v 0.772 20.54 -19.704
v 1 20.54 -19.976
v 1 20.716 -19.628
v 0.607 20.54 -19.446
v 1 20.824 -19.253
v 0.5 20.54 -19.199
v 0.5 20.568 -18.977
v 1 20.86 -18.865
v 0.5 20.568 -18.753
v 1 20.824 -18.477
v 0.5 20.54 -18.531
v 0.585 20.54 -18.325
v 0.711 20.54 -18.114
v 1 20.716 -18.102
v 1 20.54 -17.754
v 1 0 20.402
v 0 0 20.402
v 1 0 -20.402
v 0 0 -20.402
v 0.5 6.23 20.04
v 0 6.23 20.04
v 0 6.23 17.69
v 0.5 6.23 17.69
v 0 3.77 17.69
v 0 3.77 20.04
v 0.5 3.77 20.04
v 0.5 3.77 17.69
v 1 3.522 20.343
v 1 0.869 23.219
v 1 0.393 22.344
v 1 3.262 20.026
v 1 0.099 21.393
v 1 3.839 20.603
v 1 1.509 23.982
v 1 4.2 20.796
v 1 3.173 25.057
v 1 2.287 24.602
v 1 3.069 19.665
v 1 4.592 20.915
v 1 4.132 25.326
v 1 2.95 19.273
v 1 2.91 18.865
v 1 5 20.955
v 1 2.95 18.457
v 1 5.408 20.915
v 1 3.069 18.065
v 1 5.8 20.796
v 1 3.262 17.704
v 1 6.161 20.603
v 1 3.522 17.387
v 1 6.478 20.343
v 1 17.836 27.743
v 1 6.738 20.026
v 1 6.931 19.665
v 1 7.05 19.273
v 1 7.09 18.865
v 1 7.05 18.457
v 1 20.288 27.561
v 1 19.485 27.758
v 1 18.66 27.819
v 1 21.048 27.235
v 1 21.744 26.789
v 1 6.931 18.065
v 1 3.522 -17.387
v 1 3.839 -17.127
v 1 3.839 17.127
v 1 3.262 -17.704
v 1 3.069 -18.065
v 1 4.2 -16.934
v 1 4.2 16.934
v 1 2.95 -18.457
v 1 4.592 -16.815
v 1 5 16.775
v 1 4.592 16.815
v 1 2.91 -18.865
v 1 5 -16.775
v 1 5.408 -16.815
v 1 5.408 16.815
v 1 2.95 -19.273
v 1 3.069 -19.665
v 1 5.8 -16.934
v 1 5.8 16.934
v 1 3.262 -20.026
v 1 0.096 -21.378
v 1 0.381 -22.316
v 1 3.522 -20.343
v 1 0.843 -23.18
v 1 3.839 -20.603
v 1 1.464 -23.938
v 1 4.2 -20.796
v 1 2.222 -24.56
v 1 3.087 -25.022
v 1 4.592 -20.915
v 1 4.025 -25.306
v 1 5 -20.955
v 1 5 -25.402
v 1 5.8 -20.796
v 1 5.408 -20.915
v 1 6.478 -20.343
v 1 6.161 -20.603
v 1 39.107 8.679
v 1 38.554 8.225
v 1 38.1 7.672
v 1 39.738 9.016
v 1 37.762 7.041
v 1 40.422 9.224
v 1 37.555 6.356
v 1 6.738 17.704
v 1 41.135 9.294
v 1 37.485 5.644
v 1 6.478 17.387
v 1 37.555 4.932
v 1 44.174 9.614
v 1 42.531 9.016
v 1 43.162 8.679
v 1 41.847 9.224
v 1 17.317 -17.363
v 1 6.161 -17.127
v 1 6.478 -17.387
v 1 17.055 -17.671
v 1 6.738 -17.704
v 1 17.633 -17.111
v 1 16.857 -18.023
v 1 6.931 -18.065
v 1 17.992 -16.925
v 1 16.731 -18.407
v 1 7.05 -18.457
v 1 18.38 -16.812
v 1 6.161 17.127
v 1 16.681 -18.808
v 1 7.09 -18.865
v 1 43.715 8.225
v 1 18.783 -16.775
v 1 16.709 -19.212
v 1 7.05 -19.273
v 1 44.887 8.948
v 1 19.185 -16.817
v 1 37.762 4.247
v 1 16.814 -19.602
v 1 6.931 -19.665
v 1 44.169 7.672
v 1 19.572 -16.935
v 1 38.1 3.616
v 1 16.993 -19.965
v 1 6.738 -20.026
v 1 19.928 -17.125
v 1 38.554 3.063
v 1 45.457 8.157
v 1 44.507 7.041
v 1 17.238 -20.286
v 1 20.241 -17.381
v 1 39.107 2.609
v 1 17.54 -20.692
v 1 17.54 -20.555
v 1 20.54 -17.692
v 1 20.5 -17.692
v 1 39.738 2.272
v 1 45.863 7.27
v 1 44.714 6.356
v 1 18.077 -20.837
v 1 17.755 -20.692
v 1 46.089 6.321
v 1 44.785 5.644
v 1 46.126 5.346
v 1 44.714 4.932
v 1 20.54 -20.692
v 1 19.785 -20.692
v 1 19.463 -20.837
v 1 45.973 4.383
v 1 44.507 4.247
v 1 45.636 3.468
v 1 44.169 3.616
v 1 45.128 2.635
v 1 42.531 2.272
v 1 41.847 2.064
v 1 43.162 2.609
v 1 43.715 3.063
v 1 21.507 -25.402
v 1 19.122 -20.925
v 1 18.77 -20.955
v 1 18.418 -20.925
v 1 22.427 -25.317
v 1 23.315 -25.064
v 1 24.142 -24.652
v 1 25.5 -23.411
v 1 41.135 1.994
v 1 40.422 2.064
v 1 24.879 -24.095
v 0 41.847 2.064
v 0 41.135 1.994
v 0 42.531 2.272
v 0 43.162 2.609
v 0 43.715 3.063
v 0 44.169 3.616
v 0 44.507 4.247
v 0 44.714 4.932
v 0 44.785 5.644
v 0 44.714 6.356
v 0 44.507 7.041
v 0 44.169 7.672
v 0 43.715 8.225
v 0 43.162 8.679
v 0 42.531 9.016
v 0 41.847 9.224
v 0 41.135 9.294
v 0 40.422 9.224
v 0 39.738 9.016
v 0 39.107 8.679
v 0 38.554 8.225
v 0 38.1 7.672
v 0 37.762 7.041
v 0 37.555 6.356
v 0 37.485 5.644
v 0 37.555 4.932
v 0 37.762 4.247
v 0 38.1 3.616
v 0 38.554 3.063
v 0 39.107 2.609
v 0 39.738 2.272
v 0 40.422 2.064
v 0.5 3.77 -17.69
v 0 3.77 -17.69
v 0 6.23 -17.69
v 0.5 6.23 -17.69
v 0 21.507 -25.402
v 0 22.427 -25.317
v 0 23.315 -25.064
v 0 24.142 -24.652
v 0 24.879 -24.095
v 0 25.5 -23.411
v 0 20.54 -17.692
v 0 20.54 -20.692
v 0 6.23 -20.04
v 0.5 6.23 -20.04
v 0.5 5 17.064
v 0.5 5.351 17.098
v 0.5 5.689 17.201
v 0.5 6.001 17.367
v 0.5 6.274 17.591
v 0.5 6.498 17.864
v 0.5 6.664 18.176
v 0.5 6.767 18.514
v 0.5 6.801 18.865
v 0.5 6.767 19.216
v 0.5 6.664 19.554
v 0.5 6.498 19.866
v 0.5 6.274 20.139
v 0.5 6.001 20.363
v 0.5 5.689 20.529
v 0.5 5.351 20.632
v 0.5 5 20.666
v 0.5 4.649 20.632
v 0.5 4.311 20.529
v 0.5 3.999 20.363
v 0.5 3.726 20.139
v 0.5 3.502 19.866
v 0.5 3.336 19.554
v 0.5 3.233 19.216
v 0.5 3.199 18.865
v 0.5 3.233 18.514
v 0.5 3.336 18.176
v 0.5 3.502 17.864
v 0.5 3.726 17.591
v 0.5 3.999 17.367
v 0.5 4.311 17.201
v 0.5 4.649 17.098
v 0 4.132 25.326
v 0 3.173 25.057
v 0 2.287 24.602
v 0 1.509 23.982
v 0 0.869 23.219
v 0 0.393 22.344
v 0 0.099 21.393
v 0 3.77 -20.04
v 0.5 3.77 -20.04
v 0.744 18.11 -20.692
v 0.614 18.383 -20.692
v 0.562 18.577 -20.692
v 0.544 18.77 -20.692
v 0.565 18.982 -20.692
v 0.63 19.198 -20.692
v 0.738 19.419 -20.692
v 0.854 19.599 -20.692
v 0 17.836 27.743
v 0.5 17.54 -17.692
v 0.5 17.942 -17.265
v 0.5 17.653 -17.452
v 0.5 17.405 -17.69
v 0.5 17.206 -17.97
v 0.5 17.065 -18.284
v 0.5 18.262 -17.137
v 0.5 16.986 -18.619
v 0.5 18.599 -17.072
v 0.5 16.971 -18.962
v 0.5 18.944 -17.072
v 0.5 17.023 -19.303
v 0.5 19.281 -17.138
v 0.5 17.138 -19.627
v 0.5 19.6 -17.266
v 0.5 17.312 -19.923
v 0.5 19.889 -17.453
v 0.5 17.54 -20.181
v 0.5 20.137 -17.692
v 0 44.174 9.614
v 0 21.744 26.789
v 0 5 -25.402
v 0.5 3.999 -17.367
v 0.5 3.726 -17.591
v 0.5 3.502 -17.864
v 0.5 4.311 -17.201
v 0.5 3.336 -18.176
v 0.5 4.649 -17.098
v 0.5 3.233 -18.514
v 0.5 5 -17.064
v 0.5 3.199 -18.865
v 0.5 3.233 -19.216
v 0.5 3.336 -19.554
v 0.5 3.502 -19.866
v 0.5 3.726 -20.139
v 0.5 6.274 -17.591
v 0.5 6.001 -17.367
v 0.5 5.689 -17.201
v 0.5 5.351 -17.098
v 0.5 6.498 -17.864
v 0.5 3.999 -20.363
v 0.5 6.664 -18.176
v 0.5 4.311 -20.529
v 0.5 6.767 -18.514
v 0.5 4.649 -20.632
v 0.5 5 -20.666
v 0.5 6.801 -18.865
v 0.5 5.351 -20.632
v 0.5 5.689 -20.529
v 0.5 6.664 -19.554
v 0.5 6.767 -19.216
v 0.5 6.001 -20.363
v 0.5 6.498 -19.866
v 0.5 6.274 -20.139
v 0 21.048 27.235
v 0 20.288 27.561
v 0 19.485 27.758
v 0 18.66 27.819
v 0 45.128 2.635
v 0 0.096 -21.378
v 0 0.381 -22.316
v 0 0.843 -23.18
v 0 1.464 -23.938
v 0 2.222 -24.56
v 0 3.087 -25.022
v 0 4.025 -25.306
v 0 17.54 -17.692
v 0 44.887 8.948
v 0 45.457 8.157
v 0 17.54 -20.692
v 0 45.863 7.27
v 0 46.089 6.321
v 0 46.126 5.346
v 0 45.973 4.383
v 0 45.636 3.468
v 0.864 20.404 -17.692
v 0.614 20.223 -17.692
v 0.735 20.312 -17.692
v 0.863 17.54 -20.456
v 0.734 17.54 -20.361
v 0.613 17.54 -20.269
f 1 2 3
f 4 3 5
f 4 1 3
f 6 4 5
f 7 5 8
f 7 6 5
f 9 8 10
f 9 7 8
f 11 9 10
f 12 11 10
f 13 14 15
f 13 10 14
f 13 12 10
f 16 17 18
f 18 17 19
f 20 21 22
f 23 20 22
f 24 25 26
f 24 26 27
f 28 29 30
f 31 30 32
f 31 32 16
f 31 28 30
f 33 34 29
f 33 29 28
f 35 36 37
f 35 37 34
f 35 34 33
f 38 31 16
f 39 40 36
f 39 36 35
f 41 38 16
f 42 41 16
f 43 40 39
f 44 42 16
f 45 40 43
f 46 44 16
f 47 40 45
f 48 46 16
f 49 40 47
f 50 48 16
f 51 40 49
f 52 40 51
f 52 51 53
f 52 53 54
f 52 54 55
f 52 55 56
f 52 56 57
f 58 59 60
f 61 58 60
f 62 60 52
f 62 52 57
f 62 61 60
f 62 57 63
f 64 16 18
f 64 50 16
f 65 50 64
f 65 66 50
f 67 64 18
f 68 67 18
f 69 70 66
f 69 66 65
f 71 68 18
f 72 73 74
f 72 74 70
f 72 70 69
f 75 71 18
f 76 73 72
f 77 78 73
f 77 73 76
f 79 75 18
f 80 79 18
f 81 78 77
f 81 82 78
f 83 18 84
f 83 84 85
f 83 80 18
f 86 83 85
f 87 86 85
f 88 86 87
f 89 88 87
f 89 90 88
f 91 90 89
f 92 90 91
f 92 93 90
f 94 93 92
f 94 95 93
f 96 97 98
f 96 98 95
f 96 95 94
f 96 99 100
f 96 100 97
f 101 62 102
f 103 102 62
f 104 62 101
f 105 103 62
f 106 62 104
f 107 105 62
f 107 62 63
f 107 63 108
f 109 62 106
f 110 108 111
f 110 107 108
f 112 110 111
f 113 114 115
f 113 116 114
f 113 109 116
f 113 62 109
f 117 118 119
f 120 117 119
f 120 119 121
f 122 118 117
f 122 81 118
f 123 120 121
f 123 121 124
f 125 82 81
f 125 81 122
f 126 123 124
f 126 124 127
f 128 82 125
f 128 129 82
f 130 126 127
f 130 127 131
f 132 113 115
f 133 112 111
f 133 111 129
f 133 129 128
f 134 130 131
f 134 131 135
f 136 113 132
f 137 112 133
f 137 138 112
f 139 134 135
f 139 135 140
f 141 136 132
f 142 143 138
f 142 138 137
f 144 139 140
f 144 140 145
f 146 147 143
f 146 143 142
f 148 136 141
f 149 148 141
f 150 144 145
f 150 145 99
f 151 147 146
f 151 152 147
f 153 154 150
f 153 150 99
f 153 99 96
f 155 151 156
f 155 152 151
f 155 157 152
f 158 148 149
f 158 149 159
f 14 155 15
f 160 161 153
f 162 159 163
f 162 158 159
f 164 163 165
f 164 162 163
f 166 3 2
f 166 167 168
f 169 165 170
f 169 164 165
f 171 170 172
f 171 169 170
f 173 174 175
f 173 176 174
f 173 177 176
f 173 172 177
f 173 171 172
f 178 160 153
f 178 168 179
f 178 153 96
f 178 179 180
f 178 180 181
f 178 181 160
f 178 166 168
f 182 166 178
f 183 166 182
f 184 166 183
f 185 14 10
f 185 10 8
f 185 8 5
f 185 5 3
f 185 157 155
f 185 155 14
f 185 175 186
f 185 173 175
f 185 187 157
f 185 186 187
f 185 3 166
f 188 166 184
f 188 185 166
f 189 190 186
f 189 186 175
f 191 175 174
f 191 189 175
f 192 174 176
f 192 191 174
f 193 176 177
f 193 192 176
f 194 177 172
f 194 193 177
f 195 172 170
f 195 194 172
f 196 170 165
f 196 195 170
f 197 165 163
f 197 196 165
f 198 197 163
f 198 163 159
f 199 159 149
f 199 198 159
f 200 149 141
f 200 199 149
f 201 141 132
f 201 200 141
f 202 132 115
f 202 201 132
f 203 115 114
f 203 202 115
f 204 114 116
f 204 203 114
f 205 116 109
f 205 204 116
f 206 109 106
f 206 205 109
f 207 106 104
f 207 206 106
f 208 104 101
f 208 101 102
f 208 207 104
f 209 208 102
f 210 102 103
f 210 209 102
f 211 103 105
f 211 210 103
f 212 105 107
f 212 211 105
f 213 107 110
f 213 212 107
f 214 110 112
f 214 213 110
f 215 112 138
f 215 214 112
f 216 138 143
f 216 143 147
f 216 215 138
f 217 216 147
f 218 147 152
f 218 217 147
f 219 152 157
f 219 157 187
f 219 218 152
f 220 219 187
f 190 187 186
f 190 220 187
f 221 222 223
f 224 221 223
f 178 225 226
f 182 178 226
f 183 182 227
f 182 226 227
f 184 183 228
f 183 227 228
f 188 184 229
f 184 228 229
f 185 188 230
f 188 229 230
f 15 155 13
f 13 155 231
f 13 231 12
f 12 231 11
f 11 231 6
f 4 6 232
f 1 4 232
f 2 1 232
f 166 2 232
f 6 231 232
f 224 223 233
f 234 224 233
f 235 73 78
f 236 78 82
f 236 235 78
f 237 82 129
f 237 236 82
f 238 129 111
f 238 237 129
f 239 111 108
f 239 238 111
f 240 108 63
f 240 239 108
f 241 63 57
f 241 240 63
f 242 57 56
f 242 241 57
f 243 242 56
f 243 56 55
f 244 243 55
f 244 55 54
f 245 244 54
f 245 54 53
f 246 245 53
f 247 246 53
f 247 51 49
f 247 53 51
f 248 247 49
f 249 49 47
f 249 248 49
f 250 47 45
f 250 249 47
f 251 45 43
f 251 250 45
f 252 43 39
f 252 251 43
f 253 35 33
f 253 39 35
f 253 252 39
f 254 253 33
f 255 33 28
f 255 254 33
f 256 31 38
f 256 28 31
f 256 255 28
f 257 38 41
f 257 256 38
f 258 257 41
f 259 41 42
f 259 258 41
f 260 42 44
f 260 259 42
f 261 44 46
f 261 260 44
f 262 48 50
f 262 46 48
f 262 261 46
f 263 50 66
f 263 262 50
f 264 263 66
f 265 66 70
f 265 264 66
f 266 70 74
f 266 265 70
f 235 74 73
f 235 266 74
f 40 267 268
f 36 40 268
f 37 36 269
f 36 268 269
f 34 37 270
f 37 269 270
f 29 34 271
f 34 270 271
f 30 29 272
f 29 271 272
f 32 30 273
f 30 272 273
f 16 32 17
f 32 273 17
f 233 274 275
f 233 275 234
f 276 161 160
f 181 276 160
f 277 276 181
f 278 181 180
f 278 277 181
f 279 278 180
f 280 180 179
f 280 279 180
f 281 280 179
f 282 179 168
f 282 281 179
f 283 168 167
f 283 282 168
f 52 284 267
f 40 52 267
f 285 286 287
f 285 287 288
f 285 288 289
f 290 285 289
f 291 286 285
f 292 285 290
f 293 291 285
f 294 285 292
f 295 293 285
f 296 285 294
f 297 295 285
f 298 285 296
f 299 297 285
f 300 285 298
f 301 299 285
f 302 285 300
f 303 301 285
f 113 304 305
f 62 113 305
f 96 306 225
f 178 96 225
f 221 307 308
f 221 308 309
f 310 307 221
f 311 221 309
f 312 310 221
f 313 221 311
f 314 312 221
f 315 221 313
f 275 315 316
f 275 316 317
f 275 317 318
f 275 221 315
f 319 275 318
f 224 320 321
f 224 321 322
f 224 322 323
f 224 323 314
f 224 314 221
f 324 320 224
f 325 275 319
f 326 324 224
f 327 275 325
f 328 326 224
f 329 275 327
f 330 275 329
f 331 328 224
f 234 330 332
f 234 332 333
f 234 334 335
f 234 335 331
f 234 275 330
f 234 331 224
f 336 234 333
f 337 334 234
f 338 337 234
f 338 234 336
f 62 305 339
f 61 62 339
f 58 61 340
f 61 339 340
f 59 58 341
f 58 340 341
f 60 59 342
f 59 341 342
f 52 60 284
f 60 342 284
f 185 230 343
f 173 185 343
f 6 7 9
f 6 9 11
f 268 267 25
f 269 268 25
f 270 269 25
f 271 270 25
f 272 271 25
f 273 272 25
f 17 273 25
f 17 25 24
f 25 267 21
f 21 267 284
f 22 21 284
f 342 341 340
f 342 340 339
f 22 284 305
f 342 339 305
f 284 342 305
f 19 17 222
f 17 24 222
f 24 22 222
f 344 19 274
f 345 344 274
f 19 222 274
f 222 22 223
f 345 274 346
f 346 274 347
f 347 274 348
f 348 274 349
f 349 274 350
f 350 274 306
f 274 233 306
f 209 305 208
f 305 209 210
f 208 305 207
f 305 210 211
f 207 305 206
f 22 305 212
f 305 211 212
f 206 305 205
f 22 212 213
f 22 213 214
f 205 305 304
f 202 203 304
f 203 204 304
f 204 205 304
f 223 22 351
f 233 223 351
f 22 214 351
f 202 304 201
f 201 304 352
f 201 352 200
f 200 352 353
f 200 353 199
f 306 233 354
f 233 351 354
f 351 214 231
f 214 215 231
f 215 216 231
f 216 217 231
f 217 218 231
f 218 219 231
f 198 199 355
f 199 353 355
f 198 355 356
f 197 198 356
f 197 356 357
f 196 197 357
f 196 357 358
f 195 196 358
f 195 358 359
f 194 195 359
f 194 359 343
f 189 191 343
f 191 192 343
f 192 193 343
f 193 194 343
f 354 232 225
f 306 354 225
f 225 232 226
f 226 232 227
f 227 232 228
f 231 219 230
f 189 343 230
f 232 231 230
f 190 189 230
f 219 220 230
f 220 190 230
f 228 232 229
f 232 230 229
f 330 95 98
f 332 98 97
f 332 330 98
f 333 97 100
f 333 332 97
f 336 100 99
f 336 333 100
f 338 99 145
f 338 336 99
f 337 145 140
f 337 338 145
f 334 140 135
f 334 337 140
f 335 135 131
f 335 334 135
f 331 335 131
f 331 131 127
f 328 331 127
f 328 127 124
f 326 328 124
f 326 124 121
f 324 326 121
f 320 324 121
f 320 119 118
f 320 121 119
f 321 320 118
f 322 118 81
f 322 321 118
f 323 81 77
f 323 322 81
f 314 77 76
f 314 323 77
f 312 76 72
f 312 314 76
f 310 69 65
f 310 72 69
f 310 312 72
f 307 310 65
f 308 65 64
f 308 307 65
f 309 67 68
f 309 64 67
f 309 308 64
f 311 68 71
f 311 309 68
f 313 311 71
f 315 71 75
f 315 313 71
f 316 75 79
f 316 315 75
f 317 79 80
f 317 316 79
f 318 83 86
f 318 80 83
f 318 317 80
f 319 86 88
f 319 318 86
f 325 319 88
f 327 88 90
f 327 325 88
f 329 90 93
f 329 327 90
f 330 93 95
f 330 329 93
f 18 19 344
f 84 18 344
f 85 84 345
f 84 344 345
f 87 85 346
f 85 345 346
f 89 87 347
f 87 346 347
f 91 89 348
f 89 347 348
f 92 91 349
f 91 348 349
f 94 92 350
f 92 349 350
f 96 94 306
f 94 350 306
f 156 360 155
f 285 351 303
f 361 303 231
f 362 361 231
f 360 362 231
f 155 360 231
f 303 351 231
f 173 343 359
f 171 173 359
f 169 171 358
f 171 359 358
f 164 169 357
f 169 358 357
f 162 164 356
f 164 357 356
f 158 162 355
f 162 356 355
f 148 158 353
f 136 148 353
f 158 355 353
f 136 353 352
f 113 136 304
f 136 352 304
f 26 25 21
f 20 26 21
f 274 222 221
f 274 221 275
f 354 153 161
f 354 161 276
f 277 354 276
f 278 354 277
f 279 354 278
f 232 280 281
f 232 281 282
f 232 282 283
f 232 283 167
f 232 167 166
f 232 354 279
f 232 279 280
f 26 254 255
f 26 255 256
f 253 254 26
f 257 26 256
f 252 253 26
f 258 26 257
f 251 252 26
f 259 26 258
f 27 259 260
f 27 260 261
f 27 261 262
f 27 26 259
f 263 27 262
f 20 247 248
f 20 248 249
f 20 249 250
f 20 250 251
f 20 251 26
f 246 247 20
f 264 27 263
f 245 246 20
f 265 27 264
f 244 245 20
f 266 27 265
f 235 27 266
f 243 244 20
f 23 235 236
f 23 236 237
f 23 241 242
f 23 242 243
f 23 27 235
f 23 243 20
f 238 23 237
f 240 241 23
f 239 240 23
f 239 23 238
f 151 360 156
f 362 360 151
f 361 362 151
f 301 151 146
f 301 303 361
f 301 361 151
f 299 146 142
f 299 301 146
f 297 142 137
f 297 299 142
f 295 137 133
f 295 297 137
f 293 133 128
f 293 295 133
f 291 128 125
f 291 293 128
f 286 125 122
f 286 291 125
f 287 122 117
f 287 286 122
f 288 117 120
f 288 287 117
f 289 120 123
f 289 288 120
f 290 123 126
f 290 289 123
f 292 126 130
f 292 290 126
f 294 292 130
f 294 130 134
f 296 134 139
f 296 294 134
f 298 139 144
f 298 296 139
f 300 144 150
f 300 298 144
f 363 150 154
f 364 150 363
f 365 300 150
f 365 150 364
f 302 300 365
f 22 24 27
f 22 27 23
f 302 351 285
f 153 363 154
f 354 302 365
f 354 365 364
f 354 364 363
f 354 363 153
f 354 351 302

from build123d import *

# Parameters (mm, degrees)
SKETCH1_R           = 3.65
SKETCH1_W           = 3
SKETCH1_H           = 3
SKETCH1_W_2         = 2.35
SKETCH1_H_2         = 2.46
BOSS_EXTRUDE1_DEPTH = 1
SKETCH3_R           = 2.09
CUT_EXTRUDE1_DEPTH  = 0.5
CUT_EXTRUDE1_TAPER  = 30


with BuildPart() as part:
    # Sketch1 → Boss-Extrude1 (new body)
    with BuildSketch(Plane(origin=(0, 0, 0), x_dir=(0, 0, -1), z_dir=(1, 0, 0))):
        with BuildLine():
            Line((-20.402250922, 0), (20.402250922, 0))
            ThreePointArc((20.402250922, 0), (23.937784828, 1.464466094), (25.402250922, 5))
            Line((25.402250922, 5), (25.402250922, 21.50709196))
            ThreePointArc((25.402250922, 21.50709196), (24.87692273, 23.738081025), (23.411326038, 25.50026951))
            Line((23.411326038, 25.50026951), (-2.635195634, 45.127731407))
            ThreePointArc((-2.635195634, 45.127731407), (-6.321071977, 46.088536103), (-9.61416456, 44.174281334))
            Line((-9.61416456, 44.174281334), (-26.788641191, 21.74435991))
            ThreePointArc((-26.788641191, 21.74435991), (-27.676067974, 19.890565251), (-27.742786146, 17.836391544))
            Line((-27.742786146, 17.836391544), (-25.326289687, 4.131759112))
            ThreePointArc((-25.326289687, 4.131759112), (-23.61618897, 1.169777784), (-20.402250922, 0))
        make_face()
        with Locations((-5.64427075, 41.134553857)):
            Circle(SKETCH1_R, mode=Mode.SUBTRACT)
        with Locations((19.19182941, 19.04)):
            Rectangle(SKETCH1_W, SKETCH1_H, mode=Mode.SUBTRACT)
        with Locations((18.865, 5)):
            Rectangle(SKETCH1_W_2, SKETCH1_H_2, mode=Mode.SUBTRACT)
        with Locations((-18.865, 5)):
            Rectangle(SKETCH1_W_2, SKETCH1_H_2, mode=Mode.SUBTRACT)
    extrude(amount=BOSS_EXTRUDE1_DEPTH)

    # Sketch3 → Cut-Extrude1 (cut)
    with BuildSketch(Plane(origin=(1, 0, 0), x_dir=(0, 0, -1), z_dir=(1, 0, 0))):
        with Locations((-18.865, 5)):
            Circle(SKETCH3_R)
        with Locations((18.865, 5)):
            Circle(SKETCH3_R)
        with Locations((18.865, 18.77)):
            Circle(SKETCH3_R)
    extrude(amount=-CUT_EXTRUDE1_DEPTH, taper=CUT_EXTRUDE1_TAPER, mode=Mode.SUBTRACT)


solid = part.part
